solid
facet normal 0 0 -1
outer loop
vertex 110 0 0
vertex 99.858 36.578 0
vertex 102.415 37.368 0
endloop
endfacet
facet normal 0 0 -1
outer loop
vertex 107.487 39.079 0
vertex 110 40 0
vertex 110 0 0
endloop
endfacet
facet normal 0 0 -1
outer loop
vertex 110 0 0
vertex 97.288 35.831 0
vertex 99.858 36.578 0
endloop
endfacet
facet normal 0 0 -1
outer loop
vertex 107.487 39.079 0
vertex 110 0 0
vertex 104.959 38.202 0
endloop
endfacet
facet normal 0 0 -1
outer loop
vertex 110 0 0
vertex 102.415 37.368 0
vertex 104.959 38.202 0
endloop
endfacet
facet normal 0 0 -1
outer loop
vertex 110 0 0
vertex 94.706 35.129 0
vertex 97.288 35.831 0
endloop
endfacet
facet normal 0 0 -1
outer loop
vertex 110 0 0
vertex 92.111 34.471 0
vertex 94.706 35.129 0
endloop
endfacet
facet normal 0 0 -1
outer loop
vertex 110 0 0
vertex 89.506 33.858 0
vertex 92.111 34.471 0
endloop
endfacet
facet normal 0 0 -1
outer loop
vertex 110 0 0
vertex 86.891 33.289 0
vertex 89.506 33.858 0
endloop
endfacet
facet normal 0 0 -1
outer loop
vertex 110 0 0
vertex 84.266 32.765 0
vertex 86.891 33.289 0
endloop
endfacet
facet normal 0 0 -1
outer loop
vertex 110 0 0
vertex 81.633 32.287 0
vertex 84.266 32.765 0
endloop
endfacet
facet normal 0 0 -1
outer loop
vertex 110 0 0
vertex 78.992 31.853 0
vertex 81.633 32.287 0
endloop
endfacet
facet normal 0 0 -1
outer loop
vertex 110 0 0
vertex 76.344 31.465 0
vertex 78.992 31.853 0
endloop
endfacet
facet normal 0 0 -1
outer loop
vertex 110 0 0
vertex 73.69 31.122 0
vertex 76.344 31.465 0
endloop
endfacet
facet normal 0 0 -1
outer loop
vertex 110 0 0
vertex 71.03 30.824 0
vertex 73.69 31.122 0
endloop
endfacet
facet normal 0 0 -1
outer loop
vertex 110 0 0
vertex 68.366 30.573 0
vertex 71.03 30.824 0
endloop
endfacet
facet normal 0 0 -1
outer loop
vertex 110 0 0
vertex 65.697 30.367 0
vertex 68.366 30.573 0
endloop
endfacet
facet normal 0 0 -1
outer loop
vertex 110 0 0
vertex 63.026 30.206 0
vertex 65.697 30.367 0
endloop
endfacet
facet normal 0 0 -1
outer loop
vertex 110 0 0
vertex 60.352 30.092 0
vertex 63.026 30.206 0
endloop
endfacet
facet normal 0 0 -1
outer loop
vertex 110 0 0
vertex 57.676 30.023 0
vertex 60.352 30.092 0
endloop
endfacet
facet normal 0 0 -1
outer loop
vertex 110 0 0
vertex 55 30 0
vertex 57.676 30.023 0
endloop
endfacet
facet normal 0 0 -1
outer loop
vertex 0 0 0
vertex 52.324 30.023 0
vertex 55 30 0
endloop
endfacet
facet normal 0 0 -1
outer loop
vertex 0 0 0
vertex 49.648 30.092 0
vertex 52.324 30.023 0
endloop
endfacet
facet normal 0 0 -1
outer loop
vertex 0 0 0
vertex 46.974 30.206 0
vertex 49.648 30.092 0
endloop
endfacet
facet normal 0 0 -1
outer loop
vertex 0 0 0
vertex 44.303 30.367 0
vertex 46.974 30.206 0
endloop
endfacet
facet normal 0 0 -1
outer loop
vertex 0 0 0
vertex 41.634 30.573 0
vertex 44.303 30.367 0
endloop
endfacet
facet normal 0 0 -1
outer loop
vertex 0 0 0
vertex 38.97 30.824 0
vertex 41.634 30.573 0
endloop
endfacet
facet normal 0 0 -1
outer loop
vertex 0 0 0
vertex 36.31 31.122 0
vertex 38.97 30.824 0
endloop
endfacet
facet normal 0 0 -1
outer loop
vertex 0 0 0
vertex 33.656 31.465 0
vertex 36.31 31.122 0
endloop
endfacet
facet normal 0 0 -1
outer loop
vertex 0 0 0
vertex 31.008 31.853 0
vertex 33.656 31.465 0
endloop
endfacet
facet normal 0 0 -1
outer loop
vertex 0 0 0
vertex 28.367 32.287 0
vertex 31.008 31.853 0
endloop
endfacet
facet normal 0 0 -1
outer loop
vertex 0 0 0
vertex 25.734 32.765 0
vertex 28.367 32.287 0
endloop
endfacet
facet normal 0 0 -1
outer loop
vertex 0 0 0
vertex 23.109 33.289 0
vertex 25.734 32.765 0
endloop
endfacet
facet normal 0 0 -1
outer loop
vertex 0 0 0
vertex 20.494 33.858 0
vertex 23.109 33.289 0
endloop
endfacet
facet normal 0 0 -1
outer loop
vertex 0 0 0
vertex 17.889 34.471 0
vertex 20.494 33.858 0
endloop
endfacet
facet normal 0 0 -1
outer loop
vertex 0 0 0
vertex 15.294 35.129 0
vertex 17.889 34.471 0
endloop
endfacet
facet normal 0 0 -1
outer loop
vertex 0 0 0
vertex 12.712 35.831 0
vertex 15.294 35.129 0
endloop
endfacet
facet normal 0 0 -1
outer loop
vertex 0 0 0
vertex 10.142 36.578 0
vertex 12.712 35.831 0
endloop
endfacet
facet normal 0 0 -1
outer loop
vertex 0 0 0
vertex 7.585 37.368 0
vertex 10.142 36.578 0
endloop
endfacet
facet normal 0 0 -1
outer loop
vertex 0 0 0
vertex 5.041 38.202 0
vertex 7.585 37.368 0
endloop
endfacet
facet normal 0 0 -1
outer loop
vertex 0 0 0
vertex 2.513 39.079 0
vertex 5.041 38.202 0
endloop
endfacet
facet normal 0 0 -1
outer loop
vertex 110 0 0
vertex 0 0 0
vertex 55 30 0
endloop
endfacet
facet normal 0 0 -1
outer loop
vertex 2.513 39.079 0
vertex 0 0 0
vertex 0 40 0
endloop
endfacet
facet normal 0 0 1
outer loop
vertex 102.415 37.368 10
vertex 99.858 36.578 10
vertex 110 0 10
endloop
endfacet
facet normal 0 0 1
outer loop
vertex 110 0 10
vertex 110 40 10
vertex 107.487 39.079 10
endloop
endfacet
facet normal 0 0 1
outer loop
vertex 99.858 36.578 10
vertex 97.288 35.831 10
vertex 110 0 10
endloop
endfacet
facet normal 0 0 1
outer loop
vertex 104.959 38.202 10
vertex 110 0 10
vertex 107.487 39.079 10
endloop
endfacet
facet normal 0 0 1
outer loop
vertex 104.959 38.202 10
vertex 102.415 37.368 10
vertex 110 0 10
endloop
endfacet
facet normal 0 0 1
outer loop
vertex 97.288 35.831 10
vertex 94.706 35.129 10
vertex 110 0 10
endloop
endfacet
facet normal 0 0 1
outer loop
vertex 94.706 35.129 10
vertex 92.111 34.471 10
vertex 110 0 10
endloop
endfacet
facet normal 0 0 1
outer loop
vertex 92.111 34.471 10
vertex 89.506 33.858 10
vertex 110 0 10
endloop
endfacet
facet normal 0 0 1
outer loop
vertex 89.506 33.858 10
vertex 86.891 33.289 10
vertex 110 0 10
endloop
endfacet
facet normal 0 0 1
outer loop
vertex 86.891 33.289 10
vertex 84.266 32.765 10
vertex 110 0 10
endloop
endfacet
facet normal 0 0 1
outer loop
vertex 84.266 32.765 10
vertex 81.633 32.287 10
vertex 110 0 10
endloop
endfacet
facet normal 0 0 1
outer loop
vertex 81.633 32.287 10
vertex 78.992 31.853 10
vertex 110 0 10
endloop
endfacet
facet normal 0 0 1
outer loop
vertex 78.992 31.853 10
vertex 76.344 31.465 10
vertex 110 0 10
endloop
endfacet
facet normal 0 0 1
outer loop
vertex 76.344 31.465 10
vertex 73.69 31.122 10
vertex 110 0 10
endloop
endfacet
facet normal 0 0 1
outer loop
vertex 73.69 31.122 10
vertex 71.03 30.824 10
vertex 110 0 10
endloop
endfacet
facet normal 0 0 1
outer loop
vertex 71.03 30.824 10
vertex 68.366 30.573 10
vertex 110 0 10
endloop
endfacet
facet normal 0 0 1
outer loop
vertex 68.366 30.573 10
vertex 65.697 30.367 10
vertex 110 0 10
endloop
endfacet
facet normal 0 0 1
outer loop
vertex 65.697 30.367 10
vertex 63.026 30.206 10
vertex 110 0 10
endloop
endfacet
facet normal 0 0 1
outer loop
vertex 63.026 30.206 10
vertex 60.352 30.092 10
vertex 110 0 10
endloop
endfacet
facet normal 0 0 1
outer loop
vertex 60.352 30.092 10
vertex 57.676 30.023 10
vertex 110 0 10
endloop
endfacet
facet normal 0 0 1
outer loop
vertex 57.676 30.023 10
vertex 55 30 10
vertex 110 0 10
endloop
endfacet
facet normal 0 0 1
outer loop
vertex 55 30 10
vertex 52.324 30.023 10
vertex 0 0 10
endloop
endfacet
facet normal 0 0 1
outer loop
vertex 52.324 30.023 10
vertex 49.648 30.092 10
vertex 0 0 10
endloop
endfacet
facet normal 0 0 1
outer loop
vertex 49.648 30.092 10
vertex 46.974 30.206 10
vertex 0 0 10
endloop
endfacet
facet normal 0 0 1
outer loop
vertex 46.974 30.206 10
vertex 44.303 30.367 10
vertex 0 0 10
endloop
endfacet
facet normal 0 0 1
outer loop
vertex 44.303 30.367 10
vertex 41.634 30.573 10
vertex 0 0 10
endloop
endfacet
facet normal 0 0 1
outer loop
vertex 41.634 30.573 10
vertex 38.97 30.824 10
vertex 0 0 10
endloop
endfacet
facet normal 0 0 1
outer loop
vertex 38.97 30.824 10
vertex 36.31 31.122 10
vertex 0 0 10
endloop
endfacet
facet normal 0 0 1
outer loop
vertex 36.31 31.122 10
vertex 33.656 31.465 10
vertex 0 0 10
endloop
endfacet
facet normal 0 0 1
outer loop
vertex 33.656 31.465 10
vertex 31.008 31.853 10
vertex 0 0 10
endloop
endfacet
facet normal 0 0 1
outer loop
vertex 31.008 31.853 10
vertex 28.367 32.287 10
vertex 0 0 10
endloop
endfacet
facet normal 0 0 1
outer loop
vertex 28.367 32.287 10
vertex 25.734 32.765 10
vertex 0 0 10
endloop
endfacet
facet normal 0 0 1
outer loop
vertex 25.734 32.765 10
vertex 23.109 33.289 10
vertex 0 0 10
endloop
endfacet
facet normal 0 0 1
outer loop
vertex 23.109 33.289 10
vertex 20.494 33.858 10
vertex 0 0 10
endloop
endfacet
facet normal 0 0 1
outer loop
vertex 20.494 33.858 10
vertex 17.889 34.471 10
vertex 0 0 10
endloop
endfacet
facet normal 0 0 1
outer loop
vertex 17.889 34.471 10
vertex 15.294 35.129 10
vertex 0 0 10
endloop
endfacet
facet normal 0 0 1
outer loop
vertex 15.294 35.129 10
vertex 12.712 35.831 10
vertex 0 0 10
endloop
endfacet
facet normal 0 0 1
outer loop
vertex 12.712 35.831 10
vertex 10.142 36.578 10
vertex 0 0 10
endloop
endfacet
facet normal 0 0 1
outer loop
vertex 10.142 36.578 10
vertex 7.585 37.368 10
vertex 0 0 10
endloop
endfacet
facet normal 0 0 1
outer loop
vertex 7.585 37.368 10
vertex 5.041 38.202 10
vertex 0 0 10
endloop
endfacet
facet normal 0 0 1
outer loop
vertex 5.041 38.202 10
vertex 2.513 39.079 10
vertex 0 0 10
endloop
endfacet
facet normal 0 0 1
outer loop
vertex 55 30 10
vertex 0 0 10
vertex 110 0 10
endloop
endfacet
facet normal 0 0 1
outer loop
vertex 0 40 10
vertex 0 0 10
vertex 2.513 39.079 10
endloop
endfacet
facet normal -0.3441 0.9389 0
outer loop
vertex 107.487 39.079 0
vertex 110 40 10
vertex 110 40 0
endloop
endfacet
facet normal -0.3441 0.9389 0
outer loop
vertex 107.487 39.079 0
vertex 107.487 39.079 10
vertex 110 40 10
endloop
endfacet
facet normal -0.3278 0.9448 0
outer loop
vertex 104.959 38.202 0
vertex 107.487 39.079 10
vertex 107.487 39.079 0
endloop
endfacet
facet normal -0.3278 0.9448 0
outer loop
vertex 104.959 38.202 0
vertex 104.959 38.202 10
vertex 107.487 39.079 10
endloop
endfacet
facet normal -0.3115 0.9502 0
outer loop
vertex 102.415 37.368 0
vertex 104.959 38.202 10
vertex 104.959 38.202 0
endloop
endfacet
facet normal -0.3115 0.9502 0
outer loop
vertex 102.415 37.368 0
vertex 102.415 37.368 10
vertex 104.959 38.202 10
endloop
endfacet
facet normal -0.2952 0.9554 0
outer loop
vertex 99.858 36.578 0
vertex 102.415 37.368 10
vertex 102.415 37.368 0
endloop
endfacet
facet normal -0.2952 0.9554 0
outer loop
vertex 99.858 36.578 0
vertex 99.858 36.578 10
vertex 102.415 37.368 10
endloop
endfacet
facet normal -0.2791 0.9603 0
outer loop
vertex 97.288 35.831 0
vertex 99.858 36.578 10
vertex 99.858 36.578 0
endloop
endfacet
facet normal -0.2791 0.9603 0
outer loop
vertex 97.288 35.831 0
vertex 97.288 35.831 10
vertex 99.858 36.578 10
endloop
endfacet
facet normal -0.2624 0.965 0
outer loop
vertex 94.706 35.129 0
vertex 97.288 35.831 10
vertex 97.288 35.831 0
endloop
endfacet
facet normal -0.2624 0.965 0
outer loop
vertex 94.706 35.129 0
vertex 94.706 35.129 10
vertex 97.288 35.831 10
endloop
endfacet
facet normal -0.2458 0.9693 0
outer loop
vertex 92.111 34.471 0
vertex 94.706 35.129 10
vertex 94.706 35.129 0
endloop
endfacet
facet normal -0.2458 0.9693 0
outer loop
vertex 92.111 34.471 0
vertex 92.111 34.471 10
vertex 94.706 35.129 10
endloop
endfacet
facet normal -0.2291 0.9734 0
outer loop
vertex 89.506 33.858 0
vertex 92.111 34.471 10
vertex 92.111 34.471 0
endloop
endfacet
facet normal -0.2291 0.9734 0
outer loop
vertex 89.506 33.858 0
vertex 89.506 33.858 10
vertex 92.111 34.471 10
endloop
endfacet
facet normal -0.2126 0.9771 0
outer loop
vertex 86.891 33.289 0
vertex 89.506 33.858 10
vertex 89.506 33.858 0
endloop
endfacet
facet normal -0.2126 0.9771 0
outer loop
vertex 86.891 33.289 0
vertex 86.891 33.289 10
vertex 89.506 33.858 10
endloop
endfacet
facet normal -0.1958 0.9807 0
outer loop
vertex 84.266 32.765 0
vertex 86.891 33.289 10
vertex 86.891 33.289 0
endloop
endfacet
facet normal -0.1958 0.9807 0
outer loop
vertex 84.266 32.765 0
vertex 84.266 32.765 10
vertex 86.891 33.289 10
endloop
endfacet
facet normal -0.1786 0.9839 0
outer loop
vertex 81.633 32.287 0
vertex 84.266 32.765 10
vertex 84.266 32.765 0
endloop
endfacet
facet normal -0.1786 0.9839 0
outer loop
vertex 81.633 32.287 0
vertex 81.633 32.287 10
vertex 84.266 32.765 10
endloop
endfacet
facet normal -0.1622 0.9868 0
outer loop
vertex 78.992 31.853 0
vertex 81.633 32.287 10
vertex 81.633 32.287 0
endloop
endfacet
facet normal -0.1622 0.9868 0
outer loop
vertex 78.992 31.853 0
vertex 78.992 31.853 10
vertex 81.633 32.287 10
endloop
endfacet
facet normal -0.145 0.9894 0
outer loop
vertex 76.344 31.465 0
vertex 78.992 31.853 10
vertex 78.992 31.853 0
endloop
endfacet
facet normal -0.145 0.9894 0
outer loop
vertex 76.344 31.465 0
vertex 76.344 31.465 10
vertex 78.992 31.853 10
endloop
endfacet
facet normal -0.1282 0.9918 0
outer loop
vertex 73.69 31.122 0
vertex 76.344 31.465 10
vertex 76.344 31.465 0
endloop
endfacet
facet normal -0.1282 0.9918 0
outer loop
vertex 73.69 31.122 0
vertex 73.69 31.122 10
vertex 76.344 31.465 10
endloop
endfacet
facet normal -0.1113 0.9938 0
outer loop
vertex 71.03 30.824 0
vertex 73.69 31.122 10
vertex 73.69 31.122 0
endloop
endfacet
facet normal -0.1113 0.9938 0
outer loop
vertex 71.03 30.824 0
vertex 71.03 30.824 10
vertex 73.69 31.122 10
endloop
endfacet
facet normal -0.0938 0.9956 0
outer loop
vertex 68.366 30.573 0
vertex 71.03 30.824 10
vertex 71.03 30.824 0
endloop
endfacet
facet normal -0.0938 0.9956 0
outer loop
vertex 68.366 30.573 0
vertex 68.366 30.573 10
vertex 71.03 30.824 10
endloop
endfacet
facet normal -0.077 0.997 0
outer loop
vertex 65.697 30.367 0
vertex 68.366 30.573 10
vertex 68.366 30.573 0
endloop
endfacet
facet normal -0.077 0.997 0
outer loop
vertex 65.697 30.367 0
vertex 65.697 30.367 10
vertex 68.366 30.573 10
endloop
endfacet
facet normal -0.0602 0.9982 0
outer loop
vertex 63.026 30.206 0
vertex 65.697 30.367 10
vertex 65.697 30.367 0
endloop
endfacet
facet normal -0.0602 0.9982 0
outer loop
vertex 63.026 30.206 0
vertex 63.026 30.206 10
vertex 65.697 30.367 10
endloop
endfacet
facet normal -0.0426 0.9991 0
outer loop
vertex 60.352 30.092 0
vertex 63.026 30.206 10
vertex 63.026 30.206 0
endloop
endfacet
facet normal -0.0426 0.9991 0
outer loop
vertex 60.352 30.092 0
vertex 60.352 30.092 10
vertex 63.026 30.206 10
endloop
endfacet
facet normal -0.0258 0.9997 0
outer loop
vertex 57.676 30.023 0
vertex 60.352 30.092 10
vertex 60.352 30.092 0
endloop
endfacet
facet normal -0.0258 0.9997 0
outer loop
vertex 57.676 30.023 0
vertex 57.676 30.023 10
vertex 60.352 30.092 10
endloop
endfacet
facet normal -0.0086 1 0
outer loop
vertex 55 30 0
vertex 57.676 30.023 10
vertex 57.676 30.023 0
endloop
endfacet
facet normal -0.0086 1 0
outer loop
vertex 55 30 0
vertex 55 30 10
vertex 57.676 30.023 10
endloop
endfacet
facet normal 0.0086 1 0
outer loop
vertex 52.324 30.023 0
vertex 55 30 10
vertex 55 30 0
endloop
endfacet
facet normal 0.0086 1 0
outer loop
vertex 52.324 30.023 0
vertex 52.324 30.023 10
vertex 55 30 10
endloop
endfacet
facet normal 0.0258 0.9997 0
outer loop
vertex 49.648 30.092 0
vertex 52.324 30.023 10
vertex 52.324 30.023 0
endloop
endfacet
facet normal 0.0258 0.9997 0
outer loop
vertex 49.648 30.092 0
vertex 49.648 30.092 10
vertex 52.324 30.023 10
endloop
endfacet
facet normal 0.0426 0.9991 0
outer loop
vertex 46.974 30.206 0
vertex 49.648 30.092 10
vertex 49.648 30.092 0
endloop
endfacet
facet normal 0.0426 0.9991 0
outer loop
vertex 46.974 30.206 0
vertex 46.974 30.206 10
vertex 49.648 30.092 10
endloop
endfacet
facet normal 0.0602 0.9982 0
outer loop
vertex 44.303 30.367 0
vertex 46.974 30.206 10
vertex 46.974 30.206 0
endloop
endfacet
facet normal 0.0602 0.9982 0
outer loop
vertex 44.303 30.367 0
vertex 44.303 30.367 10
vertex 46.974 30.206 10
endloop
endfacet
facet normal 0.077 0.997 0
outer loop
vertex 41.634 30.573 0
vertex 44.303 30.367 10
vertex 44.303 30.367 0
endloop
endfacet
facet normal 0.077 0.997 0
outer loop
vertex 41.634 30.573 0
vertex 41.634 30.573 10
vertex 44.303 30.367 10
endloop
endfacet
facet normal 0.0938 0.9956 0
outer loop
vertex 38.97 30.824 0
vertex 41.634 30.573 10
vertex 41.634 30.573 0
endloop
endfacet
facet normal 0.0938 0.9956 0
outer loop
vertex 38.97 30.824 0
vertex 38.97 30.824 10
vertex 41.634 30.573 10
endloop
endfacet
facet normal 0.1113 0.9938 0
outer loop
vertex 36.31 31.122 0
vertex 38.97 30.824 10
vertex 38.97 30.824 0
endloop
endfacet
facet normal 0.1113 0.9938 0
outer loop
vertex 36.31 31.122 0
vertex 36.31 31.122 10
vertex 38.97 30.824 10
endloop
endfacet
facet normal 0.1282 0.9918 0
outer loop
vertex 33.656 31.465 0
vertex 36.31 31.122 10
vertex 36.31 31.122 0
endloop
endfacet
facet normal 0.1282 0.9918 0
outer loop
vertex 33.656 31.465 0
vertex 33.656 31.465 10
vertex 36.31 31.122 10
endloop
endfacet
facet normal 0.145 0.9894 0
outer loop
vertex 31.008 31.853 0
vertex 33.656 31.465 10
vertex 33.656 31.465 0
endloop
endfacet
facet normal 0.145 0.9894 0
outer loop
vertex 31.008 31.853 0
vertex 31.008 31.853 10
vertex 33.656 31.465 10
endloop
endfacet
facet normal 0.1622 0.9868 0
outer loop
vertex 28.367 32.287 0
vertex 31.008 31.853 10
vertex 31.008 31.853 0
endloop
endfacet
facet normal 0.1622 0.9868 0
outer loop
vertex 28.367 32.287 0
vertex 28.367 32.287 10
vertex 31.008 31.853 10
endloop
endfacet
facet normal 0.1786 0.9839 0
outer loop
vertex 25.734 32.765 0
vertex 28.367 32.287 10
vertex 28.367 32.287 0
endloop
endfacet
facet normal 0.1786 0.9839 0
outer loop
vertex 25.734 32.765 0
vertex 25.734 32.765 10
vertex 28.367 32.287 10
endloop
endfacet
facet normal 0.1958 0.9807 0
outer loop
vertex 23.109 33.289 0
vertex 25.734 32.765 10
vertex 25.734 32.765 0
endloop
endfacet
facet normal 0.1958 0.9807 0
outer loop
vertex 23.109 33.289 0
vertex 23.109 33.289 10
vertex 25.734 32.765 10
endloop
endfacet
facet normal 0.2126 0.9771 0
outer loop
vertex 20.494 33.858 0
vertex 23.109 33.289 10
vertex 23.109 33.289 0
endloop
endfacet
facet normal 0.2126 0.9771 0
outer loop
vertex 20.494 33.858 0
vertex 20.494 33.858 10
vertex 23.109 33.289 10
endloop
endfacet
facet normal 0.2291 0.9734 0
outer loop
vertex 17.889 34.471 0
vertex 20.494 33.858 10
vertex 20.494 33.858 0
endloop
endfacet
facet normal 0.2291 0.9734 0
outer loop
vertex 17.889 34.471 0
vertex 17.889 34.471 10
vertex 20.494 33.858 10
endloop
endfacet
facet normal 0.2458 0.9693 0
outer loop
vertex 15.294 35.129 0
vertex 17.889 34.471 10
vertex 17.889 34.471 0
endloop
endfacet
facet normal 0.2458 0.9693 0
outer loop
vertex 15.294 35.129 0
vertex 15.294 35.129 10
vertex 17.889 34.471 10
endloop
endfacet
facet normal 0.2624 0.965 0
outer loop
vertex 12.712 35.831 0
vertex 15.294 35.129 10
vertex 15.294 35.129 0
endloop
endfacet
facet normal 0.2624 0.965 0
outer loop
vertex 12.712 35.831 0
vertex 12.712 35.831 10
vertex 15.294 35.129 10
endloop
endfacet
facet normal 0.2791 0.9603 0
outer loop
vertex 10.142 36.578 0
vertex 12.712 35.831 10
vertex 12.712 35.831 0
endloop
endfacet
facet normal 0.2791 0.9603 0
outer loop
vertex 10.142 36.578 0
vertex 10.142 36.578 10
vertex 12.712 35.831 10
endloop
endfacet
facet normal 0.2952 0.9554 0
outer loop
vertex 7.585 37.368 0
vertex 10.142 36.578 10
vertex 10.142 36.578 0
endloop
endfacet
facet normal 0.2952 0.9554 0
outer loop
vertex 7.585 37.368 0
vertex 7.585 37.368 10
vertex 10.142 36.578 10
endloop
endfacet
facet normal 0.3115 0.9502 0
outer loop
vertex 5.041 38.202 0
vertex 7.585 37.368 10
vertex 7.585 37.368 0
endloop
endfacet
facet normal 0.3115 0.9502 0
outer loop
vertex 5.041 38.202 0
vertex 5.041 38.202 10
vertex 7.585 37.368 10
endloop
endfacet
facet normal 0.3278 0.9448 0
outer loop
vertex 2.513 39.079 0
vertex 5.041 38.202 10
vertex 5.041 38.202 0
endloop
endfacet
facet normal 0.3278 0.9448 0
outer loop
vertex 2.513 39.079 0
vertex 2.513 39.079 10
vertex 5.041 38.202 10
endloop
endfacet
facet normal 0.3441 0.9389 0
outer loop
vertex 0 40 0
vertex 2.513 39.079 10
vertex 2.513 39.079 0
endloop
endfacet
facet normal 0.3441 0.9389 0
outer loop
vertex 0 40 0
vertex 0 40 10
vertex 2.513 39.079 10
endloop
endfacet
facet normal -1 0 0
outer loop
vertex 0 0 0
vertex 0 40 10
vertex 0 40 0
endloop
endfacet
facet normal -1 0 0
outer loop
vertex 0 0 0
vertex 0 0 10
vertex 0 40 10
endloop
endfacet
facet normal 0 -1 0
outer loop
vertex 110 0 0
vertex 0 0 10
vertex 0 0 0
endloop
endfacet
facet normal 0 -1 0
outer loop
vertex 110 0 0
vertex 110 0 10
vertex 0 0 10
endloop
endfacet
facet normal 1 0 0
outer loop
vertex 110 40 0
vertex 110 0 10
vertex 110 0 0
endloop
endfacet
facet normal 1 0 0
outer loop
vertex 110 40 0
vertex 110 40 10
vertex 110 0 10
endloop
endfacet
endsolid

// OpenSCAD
$fn = 32;

// ----------------------------------------------------------------------
// Arc profile plate: notch, 45 points
// ----------------------------------------------------------------------

// --- parameters (mm) ---
bar_l = 110;              // bar length, X
bar_w = 40;               // bar width, Y
notch_depth = 10;         // depth of the arc notch at mid-span
arc_r = 156.25;           // radius of the notch arc
arc_angle = 41.22;        // notch arc angle, degrees
arc_step = 1;             // sampling step of the notch arc, degrees
plate_t = 10;             // plate thickness, Z
fit_tol = 0.02;           // declared fit tolerance (prompt contract)
free_tol = 0.2;           // declared free tolerance (prompt contract)

profile = [[0, 0], [110, 0], [110, 40], [107.487, 39.079], [104.959, 38.202], [102.415, 37.368], [99.858, 36.578], [97.288, 35.831], [94.706, 35.129], [92.111, 34.471], [89.506, 33.858], [86.891, 33.289], [84.266, 32.765], [81.633, 32.287], [78.992, 31.853], [76.344, 31.465], [73.69, 31.122], [71.03, 30.824], [68.366, 30.573], [65.697, 30.367], [63.026, 30.206], [60.352, 30.092], [57.676, 30.023], [55, 30], [52.324, 30.023], [49.648, 30.092], [46.974, 30.206], [44.303, 30.367], [41.634, 30.573], [38.97, 30.824], [36.31, 31.122], [33.656, 31.465], [31.008, 31.853], [28.367, 32.287], [25.734, 32.765], [23.109, 33.289], [20.494, 33.858], [17.889, 34.471], [15.294, 35.129], [12.712, 35.831], [10.142, 36.578], [7.585, 37.368], [5.041, 38.202], [2.513, 39.079], [0, 40]];  // primary outline, 45 points, counter clockwise

// --- the one profile operation ---
linear_extrude(height = plate_t) polygon(points = profile);
